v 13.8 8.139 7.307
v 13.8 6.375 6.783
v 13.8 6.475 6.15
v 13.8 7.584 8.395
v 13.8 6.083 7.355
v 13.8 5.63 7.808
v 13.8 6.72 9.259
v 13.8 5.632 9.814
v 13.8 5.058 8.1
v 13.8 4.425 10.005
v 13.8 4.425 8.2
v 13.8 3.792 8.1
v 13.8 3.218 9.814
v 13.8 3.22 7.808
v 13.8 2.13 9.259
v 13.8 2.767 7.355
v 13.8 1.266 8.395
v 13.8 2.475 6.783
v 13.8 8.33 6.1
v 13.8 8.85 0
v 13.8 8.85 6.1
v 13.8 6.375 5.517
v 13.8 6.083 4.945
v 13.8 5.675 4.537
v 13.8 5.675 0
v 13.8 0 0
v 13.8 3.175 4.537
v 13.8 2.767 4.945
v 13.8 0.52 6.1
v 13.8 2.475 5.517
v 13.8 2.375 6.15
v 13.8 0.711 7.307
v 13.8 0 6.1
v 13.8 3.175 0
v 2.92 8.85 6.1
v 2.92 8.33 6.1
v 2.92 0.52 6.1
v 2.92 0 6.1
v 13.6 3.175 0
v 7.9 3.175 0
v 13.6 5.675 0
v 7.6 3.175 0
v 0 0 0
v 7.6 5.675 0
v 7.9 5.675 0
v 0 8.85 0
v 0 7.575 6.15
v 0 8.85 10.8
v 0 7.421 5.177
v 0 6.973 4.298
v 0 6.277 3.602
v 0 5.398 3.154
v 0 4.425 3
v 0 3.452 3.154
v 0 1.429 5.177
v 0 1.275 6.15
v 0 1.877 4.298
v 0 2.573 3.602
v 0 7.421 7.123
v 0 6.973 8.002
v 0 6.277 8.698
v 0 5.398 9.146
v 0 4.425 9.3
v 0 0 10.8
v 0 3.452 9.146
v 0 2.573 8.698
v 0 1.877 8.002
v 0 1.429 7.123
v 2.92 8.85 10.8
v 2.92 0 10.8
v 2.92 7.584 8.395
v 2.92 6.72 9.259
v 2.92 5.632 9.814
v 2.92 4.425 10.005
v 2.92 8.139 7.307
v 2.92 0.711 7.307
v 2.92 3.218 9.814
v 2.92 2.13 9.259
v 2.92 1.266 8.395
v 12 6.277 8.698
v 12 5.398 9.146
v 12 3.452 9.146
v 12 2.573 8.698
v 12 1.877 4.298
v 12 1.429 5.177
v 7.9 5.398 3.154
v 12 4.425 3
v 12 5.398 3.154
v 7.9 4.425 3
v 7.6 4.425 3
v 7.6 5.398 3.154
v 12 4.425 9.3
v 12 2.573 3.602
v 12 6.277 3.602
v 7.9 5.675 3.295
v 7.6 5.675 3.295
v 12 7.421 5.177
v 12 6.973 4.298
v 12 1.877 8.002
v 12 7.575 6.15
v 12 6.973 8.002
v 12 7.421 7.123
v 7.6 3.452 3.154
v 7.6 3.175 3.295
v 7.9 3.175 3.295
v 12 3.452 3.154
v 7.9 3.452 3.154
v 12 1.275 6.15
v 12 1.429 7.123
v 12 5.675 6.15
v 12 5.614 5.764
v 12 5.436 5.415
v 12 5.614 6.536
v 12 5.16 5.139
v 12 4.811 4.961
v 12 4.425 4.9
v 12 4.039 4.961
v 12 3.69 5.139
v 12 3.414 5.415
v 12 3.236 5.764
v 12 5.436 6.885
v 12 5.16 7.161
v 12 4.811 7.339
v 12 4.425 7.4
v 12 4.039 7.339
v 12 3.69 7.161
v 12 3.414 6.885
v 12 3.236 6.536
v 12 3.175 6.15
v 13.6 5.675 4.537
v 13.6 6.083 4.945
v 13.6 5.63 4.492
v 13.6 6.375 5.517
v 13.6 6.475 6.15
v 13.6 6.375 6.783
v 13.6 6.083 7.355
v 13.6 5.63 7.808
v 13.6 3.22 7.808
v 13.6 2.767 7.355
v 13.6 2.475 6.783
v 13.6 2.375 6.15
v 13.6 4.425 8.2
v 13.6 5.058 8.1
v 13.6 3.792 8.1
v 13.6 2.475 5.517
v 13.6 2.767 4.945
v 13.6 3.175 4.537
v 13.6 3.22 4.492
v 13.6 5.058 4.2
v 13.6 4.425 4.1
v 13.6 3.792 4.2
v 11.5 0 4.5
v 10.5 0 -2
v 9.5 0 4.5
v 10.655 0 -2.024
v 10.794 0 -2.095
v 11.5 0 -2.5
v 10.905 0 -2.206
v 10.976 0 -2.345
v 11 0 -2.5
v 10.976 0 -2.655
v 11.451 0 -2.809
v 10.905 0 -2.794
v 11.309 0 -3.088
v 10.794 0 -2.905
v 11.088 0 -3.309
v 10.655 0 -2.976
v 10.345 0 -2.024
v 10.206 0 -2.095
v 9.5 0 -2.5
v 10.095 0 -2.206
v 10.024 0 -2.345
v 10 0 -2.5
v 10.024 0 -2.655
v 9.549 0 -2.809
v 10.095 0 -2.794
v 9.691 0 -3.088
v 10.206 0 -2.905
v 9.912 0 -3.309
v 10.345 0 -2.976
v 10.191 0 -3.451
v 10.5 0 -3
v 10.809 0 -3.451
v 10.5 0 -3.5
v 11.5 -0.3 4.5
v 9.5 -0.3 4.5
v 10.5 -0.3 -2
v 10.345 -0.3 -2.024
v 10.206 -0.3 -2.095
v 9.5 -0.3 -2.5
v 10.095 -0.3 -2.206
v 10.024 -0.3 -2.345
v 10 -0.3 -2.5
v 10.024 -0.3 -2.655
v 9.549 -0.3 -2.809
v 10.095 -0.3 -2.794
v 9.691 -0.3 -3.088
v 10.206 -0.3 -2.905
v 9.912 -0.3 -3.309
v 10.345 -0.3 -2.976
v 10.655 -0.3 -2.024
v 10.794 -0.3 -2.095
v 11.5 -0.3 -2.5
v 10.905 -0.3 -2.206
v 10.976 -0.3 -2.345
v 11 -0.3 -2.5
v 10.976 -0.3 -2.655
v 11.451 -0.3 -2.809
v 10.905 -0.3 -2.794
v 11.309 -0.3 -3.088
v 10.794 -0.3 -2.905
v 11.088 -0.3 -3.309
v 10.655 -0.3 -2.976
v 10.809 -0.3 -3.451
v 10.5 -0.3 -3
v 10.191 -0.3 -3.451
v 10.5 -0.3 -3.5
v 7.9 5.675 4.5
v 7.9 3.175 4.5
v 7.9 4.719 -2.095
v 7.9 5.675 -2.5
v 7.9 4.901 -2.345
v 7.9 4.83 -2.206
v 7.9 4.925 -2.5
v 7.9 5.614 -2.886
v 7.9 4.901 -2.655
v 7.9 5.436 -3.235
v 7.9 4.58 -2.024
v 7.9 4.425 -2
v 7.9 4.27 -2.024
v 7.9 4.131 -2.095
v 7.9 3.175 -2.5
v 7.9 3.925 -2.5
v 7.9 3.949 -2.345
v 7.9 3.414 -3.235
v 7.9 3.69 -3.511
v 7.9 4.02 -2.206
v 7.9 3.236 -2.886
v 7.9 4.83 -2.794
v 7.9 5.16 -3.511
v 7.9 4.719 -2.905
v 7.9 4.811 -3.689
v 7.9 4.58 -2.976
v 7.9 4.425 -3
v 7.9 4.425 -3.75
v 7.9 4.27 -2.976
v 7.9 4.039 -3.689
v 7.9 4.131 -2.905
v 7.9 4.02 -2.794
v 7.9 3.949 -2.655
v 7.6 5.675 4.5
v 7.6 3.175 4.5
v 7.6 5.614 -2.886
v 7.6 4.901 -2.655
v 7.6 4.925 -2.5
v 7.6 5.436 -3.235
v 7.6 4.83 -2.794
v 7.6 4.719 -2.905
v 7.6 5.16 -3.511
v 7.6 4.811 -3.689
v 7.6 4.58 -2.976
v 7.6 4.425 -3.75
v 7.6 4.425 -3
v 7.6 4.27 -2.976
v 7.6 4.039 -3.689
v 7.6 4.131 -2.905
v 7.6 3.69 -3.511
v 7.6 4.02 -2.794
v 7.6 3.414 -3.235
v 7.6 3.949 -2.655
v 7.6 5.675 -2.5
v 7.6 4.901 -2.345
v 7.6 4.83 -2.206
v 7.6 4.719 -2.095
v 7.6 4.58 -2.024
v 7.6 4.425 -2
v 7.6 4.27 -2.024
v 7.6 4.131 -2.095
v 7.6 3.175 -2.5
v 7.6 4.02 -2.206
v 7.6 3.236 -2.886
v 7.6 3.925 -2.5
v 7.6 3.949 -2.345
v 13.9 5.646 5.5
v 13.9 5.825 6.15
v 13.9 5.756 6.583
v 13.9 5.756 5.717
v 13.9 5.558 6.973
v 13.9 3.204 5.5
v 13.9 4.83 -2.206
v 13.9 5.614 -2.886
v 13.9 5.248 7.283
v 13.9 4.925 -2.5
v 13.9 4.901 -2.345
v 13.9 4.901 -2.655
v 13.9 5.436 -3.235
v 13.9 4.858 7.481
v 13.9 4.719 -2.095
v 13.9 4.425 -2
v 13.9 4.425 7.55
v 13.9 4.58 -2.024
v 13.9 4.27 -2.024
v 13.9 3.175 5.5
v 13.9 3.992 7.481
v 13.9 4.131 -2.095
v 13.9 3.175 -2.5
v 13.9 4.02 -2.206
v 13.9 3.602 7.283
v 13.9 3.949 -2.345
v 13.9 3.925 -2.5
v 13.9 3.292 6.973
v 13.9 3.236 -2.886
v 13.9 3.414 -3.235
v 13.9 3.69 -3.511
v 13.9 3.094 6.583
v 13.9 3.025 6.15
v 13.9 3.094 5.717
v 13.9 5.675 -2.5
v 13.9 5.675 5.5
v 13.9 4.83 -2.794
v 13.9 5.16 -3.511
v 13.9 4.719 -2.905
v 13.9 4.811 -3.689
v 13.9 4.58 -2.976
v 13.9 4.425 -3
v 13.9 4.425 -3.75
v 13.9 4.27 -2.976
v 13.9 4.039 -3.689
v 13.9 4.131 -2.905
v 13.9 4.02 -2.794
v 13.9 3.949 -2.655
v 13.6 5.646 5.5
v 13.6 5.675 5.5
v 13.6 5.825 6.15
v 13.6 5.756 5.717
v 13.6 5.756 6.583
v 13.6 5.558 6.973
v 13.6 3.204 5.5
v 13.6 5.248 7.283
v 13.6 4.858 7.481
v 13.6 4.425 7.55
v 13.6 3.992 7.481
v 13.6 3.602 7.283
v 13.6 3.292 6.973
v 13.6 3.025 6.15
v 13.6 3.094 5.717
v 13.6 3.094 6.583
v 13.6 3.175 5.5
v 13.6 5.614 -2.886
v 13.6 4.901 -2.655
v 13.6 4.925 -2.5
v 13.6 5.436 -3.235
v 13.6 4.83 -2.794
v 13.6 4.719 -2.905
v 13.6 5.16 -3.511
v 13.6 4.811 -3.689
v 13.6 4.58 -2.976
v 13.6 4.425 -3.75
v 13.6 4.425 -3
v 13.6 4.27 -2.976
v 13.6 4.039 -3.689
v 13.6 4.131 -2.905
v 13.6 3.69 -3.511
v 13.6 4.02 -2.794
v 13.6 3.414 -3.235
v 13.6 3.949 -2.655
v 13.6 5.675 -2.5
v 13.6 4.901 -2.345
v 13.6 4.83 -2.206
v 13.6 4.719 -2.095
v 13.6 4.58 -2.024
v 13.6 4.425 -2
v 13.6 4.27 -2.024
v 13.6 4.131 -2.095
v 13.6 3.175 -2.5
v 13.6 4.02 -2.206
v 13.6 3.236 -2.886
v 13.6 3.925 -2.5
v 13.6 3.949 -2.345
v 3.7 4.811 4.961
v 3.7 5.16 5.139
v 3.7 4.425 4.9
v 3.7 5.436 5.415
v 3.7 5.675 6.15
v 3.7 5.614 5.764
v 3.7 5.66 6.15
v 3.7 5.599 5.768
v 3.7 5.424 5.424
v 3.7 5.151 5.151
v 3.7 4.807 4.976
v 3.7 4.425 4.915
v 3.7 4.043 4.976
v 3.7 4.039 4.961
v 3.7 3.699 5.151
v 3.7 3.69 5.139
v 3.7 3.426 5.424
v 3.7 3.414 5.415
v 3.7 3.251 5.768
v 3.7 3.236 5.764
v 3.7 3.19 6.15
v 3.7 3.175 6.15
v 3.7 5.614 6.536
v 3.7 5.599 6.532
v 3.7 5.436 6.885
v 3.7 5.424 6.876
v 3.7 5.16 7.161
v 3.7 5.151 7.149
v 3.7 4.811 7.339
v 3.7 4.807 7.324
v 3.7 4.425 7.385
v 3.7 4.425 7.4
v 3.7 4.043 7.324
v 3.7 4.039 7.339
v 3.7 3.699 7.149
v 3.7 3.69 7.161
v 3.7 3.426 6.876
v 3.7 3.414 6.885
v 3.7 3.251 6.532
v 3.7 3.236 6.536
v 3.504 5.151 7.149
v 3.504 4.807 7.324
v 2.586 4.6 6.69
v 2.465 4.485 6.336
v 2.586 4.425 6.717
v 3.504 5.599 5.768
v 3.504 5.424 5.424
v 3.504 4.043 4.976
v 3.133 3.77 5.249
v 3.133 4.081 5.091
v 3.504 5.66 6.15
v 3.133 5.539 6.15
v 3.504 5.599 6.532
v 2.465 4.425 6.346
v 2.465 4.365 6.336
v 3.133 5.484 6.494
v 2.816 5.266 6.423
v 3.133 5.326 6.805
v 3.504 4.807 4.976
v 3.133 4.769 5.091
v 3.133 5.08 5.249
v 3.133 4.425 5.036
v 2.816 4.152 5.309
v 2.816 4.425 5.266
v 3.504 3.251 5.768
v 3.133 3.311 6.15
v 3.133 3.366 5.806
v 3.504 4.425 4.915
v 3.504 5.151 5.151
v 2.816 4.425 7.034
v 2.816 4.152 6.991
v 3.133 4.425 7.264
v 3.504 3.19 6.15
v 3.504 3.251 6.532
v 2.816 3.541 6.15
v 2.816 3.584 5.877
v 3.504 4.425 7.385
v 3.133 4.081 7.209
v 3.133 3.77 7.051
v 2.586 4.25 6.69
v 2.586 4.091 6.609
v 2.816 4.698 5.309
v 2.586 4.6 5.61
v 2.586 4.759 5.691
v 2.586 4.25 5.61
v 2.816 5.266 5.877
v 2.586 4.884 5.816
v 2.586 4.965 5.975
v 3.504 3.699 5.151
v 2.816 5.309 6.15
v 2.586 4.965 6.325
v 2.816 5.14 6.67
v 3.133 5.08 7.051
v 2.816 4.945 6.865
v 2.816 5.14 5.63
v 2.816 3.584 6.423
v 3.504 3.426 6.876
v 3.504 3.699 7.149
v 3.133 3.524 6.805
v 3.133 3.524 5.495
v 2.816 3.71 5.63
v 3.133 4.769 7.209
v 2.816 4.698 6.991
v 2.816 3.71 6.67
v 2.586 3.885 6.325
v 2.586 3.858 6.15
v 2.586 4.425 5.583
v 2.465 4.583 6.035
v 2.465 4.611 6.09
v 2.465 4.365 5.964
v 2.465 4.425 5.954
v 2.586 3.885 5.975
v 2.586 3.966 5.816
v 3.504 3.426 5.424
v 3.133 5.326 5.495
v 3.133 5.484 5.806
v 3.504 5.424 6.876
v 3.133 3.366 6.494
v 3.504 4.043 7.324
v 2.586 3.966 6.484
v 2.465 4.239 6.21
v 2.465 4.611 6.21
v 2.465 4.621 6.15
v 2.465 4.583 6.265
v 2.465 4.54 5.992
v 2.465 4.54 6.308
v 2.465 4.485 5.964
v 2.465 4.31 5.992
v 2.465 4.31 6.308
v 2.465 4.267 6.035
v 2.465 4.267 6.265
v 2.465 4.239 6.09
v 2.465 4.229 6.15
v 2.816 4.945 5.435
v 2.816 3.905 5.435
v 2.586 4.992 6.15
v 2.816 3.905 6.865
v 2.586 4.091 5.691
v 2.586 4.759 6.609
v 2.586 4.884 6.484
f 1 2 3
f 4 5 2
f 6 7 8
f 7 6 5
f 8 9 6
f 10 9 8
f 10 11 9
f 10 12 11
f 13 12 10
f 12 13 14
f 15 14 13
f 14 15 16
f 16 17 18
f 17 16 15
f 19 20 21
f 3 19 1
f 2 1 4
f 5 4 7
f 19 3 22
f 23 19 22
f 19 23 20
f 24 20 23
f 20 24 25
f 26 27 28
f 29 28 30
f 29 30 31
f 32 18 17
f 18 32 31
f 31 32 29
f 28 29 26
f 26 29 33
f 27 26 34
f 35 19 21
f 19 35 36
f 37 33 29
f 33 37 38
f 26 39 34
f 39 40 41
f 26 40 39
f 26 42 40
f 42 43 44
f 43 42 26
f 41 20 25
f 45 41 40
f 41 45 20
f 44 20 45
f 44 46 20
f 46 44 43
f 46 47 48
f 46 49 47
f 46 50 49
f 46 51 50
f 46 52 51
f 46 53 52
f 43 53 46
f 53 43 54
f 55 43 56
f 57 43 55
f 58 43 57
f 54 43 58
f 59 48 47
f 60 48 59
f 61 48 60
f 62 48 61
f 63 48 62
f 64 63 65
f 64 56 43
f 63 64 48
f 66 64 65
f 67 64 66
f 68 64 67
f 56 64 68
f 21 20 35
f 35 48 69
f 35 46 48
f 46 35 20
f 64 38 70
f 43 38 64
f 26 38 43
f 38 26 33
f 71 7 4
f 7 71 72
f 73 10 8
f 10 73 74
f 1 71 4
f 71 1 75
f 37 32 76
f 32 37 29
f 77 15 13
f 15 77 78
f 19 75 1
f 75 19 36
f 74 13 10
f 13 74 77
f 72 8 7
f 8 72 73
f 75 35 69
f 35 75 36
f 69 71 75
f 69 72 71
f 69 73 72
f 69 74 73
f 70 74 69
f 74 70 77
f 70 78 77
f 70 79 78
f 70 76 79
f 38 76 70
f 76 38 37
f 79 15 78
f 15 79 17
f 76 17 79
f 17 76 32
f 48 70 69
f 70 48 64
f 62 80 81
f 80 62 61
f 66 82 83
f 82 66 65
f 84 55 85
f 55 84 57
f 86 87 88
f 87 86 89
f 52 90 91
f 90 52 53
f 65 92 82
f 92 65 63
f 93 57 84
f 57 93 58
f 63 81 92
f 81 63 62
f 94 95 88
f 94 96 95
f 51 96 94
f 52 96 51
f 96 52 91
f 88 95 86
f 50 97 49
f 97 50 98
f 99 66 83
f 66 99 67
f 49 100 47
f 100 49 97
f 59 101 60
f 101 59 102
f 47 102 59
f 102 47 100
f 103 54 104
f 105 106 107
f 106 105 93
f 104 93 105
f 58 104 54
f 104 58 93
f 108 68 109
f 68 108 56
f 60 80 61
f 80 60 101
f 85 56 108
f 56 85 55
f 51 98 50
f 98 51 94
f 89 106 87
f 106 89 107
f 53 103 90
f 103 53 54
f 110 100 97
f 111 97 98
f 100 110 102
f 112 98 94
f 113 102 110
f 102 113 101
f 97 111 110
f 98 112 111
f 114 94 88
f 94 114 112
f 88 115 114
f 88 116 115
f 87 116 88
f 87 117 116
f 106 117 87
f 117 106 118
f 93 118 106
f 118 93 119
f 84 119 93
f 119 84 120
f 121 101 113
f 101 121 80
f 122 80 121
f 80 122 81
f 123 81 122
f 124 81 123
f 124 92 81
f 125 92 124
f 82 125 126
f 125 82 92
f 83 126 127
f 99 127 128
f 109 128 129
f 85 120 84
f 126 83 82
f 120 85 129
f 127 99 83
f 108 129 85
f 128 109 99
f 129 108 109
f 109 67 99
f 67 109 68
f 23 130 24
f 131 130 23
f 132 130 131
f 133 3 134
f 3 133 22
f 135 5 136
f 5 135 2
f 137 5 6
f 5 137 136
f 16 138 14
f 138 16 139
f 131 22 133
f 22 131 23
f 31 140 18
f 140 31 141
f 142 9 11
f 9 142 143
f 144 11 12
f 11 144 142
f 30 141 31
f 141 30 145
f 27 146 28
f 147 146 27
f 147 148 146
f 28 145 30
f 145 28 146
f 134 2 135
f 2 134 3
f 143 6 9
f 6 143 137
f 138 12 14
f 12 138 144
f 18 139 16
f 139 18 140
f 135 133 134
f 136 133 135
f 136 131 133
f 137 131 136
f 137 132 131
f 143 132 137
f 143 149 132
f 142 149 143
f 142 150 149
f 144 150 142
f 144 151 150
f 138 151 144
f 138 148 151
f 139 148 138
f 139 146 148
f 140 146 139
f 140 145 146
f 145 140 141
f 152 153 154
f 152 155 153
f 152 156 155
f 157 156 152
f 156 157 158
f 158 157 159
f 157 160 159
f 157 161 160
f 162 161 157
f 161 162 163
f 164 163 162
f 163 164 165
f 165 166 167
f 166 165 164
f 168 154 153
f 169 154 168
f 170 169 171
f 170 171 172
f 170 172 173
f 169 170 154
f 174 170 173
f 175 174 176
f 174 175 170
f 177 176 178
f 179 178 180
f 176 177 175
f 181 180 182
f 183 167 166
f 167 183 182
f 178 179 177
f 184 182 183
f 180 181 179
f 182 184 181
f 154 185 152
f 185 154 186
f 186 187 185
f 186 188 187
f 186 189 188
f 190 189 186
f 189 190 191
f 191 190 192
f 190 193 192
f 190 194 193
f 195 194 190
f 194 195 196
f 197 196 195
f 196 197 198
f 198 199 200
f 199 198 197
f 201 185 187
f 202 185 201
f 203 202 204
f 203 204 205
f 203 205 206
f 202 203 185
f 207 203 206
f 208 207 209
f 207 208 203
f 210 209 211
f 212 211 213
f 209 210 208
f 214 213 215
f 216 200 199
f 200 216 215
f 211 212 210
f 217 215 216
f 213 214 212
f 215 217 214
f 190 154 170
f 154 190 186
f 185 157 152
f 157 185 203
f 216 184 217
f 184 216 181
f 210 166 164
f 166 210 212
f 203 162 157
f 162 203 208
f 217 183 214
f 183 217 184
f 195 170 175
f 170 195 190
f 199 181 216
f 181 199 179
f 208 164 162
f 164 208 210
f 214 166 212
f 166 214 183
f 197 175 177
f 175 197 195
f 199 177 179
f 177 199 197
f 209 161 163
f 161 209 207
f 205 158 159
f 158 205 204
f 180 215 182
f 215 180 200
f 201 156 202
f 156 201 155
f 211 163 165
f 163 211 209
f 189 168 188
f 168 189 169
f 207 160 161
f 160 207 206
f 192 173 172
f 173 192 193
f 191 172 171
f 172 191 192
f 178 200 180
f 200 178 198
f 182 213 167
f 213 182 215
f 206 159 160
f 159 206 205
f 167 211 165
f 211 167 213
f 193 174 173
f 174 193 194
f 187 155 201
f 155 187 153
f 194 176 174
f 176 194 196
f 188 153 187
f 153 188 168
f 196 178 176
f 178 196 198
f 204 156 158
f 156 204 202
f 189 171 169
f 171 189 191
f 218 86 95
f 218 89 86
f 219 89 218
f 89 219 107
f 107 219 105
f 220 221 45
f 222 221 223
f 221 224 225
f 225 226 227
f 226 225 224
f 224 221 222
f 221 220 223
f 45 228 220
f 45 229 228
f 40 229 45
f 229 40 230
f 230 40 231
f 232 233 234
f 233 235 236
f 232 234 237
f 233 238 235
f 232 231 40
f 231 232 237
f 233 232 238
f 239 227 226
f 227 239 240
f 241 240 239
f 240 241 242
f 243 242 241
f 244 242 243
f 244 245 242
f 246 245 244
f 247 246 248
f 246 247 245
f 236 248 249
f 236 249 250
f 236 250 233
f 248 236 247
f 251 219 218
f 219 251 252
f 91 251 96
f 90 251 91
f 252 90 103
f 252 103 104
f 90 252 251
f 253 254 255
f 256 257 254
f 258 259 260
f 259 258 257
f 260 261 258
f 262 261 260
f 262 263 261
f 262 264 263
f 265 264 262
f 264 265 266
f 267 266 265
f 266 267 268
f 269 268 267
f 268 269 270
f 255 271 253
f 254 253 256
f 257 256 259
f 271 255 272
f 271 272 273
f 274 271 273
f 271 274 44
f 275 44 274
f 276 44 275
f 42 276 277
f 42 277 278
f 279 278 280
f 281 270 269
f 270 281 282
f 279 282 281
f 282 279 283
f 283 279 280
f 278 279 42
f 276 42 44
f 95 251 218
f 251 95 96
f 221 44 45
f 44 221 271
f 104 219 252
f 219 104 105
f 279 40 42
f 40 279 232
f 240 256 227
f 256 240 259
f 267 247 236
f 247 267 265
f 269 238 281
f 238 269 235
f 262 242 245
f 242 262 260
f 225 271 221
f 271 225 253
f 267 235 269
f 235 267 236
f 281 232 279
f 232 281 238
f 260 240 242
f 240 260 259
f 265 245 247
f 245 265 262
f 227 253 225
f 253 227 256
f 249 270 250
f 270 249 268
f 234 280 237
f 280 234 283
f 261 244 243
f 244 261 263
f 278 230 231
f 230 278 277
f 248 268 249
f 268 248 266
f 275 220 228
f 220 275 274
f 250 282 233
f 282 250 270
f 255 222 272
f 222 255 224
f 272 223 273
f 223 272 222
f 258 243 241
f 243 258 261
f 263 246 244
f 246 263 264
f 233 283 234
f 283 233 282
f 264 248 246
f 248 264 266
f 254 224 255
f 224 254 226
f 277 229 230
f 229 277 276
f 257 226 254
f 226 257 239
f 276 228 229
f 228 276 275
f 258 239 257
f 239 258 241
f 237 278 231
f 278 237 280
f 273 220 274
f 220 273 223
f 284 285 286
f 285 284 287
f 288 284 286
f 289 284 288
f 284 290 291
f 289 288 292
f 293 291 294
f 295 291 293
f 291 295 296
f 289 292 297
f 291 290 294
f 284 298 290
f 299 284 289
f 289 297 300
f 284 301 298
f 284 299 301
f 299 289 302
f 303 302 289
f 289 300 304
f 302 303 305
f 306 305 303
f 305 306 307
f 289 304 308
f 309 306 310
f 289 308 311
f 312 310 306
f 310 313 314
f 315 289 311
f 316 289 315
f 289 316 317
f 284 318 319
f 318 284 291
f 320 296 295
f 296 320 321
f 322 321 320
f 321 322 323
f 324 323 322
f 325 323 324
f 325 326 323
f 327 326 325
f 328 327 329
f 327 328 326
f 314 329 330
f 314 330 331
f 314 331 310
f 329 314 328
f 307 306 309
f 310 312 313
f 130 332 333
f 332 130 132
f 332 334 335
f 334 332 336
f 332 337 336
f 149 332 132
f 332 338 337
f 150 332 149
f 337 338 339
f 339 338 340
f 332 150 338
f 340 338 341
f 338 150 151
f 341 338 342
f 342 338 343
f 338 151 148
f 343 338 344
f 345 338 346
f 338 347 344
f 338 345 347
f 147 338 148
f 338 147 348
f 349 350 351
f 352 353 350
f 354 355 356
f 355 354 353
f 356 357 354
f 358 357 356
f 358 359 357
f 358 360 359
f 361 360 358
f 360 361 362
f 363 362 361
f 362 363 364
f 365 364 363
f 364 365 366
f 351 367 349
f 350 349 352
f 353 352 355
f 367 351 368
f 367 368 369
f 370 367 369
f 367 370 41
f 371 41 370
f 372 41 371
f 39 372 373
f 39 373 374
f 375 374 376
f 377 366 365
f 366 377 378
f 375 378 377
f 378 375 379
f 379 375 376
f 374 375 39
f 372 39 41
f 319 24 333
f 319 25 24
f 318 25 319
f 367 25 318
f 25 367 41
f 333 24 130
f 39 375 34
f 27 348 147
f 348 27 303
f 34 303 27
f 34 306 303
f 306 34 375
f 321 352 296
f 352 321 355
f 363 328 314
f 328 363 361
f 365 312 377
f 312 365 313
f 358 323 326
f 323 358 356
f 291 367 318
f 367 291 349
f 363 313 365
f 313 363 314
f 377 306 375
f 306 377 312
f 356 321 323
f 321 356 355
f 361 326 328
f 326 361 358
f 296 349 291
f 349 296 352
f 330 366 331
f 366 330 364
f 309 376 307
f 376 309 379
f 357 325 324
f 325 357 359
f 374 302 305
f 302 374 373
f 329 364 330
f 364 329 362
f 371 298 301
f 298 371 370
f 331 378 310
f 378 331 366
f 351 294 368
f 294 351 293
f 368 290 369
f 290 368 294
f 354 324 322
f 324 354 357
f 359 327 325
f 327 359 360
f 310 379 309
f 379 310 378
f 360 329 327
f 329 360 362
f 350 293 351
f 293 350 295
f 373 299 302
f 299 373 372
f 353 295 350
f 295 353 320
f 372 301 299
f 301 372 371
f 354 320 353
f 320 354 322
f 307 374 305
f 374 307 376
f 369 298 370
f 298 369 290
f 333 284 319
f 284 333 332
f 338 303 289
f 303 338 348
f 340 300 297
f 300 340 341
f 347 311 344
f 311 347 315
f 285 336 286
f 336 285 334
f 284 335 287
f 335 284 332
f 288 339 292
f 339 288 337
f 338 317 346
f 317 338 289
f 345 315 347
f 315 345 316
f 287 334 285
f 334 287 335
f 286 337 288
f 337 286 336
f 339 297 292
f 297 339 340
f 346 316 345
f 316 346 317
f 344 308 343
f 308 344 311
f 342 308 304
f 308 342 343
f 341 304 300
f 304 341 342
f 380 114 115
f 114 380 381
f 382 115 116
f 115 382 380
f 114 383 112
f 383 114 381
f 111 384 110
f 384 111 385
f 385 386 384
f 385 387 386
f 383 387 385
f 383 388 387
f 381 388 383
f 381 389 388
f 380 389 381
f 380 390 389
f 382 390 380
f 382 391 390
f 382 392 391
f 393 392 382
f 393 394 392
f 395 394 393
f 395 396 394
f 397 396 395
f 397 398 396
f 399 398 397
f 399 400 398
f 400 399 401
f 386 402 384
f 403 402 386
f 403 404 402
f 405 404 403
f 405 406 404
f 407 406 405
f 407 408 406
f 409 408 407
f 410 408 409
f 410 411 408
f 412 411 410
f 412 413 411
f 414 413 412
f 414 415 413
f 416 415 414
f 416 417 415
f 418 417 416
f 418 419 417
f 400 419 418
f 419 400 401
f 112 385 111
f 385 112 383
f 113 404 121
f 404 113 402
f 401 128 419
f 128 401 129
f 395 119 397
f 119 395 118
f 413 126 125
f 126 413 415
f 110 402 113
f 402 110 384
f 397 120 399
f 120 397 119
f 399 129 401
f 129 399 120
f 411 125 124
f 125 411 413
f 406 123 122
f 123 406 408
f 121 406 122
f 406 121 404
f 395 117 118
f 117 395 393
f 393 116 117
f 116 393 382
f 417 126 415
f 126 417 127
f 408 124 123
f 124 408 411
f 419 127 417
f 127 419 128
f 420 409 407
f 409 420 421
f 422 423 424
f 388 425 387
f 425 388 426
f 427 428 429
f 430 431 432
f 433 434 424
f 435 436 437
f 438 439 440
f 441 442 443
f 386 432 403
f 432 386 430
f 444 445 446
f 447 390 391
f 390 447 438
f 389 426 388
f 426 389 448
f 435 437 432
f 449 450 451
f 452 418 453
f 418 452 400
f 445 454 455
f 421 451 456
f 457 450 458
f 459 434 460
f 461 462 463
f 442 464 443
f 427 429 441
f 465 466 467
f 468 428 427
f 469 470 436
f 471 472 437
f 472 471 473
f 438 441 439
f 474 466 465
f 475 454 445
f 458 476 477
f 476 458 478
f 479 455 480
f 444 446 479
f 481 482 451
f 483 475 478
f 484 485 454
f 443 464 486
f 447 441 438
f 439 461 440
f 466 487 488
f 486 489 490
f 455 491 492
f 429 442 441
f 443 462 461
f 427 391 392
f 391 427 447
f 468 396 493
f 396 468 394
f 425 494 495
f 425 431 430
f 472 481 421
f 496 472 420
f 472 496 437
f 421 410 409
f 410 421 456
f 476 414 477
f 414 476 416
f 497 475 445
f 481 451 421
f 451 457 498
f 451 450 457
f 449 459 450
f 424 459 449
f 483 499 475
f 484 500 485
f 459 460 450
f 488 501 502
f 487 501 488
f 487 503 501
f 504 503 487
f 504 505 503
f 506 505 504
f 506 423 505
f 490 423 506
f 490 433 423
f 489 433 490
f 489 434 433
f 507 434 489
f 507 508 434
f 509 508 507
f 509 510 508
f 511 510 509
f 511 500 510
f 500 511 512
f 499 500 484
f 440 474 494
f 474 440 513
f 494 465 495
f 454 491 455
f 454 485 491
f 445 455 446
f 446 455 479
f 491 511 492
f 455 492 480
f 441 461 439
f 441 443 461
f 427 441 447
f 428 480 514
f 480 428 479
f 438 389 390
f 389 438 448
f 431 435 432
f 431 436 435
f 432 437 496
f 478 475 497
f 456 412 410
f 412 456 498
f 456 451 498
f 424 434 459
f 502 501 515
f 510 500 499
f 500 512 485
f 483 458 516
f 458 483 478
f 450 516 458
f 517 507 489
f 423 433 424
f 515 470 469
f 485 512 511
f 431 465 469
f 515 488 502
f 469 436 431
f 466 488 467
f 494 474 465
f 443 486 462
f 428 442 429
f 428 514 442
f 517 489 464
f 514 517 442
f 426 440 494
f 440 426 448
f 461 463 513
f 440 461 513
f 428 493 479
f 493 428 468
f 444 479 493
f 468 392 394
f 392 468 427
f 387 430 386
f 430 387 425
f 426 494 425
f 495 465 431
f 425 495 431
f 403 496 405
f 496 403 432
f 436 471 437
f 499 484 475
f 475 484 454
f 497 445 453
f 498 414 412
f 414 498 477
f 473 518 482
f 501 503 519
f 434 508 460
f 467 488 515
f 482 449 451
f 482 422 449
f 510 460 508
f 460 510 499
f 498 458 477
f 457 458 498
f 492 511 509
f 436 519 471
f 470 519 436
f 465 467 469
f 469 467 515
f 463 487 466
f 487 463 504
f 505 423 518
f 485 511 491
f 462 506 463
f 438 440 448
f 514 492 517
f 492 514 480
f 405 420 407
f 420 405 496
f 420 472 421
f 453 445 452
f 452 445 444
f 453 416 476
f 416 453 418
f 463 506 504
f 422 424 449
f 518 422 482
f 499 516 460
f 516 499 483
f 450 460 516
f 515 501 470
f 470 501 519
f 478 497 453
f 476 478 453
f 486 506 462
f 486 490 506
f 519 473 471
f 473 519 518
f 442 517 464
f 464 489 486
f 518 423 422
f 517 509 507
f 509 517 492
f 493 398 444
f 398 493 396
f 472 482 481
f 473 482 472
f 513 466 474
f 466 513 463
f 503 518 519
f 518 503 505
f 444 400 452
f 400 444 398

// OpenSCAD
$fn=20;


difference(){

    union(){
        cube([13.8,8.85,6.1]);

        translate([13.8-10.88,8.85/2,6.1])
        rotate([0,90,0])
        cylinder(r=7.81/2,h=10.88);


        translate([0,8.85,0])
        rotate([0,0,-90])
        cube([8.85,13.8-10.88,10.8]);
    }
    
    translate([0,8.85/2,6.3/2+3])
    rotate([0,90,0])
    cylinder(r=6.3/2, h=12);
    
    translate([13.6,8.85/2,6.3/2+3])
    rotate([0,90,0])
    cylinder(r=4.1/2, h=1);
}


module pin(w){
    
    difference(){
        union(){
            cube([0.3,w,7]);
            
            translate([0,w/2,0])
            rotate([0,90,0])
            cylinder(h=0.3,r=w/2);
        }
        
        translate([0,w/2,0])
        rotate([0,90,0])
        cylinder(h=0.3,r=1/2);
    }
}

translate([11.5,-0.3,-2.5])
rotate([0,0,90])
pin(2);

translate([13.8-0.2 -6,8.85/2 -2.5/2,-2.5])
pin(2.5);

translate([13.8-0.2,8.85/2 -2.5/2,-2.5]){
    pin(2.5);
    translate([0,0,1]) cube([0.3,2.5,7]);
    
    translate([0,2.5/2,6.3/2+3+2.5])
    rotate([0,90,0])
    cylinder(h=0.3,r=1.4);
}

    translate([1.2+2.5,8.85/2,6.3/2+3])
    rotate([0,90,0]){
        cylinder(r=2.5/2, h=11-2.5);
        sphere(2.5/2);
    }
